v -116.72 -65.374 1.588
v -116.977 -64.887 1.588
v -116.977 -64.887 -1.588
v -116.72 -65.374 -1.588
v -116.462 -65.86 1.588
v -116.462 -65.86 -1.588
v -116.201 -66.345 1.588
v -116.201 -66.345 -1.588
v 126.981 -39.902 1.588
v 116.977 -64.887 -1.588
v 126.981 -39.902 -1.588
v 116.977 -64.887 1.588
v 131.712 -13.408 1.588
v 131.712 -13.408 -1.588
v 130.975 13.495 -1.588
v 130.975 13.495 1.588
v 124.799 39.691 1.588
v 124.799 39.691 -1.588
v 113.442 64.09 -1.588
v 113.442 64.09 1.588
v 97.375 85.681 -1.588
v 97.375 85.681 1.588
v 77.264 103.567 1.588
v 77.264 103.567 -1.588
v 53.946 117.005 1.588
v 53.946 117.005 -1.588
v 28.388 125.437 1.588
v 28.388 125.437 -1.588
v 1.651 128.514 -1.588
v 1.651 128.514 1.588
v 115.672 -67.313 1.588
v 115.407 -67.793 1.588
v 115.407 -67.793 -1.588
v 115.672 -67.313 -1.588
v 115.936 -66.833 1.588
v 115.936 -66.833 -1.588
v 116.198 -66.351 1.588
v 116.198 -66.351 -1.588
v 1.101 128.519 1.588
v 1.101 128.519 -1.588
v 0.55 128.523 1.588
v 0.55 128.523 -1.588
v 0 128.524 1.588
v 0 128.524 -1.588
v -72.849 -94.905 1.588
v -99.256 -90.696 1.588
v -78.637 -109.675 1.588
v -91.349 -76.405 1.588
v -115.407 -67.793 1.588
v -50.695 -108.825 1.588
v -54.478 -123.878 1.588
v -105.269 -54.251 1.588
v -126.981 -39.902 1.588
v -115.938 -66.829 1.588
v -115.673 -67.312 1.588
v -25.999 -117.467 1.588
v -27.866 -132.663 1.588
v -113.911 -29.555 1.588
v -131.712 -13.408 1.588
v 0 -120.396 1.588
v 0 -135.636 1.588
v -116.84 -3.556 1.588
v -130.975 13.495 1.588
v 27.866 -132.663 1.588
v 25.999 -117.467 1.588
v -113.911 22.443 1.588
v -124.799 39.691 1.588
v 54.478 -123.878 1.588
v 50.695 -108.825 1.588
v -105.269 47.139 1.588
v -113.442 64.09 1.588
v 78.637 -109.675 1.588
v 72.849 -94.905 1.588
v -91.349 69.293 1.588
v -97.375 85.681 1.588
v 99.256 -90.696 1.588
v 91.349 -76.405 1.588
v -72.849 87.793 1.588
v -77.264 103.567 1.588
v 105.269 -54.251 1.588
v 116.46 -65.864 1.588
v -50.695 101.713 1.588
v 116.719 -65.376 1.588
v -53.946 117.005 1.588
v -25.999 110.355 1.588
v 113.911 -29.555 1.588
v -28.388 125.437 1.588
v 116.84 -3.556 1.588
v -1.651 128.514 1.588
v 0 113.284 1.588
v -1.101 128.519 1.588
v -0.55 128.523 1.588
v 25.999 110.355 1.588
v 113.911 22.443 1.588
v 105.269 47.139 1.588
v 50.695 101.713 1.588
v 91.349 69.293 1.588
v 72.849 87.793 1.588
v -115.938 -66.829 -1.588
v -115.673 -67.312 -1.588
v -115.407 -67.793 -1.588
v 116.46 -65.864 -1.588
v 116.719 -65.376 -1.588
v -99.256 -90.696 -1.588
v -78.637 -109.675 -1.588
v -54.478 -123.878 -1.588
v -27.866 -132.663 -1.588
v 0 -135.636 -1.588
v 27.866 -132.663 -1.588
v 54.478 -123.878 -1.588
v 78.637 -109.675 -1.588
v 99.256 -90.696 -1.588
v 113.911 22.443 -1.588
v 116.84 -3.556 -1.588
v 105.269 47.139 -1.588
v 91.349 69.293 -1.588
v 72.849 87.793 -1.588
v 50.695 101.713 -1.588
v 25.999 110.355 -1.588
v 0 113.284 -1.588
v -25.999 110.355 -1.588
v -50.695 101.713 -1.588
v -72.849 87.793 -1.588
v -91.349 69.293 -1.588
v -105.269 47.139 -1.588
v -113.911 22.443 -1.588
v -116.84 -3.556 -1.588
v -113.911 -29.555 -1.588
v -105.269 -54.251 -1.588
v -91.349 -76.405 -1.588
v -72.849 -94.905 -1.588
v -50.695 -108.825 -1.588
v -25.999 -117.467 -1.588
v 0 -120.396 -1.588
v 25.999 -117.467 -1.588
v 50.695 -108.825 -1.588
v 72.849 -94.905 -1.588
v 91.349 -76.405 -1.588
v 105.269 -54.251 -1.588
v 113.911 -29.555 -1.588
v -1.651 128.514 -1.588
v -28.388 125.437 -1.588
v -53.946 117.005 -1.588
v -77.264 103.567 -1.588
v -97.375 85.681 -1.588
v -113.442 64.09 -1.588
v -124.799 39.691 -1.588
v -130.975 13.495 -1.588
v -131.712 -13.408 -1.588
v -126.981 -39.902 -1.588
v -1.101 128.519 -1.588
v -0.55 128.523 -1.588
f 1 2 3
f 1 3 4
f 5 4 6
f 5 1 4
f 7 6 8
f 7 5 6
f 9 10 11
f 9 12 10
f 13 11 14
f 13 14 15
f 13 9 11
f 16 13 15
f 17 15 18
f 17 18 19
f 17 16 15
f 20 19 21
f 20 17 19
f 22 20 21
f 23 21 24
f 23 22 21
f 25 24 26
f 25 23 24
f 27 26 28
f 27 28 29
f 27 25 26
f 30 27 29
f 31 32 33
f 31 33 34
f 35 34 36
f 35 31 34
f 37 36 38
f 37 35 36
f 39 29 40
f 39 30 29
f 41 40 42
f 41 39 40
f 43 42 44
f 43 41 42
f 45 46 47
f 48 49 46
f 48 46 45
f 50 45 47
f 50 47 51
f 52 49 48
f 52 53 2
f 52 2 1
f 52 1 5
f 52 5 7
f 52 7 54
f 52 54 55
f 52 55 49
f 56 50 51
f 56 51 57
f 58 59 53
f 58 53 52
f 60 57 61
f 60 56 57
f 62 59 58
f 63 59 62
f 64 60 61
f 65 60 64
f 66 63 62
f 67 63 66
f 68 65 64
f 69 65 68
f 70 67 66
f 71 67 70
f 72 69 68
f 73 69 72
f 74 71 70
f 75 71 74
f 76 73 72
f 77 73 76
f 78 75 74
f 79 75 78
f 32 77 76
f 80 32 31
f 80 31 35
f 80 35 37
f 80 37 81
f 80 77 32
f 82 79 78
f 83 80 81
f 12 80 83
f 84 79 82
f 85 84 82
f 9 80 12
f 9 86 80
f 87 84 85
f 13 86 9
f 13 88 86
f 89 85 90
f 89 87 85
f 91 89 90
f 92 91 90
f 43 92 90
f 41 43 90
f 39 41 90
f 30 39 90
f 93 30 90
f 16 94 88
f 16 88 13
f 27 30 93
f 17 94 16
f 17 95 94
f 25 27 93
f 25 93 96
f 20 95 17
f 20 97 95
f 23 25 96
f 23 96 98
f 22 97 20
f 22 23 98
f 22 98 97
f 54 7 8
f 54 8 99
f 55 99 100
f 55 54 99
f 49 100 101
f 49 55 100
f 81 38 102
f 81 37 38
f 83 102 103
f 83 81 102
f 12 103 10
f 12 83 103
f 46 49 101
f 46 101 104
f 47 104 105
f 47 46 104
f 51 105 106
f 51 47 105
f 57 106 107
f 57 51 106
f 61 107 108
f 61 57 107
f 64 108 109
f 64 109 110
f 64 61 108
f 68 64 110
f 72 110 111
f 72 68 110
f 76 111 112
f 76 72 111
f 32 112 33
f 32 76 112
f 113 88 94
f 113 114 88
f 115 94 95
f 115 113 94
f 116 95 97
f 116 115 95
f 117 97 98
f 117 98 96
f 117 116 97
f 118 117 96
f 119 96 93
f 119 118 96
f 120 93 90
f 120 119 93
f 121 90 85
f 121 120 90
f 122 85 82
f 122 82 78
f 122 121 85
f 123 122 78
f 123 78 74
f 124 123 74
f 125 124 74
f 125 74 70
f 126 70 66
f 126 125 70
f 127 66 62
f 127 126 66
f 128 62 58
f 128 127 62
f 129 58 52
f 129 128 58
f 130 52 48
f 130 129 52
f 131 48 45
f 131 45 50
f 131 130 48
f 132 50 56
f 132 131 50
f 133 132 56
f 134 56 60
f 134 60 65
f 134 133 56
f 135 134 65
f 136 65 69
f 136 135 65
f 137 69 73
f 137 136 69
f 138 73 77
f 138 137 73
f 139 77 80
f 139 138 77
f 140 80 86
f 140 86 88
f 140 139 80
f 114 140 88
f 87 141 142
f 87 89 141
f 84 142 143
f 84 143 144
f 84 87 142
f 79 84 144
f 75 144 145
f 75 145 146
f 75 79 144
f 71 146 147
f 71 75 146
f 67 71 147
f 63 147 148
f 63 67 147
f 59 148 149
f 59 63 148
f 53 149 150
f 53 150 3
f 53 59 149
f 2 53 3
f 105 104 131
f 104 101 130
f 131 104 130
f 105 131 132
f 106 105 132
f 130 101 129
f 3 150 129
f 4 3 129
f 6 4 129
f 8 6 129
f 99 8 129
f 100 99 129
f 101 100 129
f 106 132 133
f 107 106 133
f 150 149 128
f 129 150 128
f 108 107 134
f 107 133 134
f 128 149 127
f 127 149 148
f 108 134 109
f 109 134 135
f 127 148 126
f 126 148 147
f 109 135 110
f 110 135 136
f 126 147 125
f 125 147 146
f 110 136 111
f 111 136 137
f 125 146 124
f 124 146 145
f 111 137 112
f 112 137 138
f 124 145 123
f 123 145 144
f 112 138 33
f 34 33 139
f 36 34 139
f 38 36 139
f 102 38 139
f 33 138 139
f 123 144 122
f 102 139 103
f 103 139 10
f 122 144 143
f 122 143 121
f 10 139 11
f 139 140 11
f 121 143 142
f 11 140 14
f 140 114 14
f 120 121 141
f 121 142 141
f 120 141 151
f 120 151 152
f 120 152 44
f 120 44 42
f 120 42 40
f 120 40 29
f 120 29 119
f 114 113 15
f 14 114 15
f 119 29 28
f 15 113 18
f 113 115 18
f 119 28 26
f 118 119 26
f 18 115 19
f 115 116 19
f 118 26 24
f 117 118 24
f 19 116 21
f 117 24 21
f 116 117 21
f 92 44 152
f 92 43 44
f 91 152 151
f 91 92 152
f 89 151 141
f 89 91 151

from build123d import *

# Parameters (mm, degrees)
SKETCH2_R           = 116.84
BOSS_EXTRUDE1_DEPTH = 1.5875


with BuildPart() as part:
    # Sketch2 → Boss-Extrude1 (new, symmetric)
    with BuildSketch(Plane.XY):
        with BuildLine():
            ThreePointArc((-1.651, 128.513680847), (-113.44208216, 64.09028885), (-116.977106193, -64.886930424))
            ThreePointArc((-116.977106193, -64.886930424), (-116.59127356, -65.61727077), (-116.200881143, -66.345183954))
            ThreePointArc((-116.200881143, -66.345183954), (-115.806084025, -67.070386581), (-115.406761019, -67.793106963))
            ThreePointArc((-115.406761019, -67.793106963), (0, -135.636), (115.406761019, -67.793106963))
            ThreePointArc((115.406761019, -67.793106963), (115.804512811, -67.073251299), (116.197774523, -66.350932884))
            ThreePointArc((116.197774523, -66.350932884), (116.589738292, -65.620154913), (116.977106193, -64.886930424))
            ThreePointArc((116.977106193, -64.886930424), (113.44208216, 64.09028885), (1.651, 128.513680847))
            ThreePointArc((1.651, 128.513680847), (0.825516124, 128.521420187), (0, 128.524))
            ThreePointArc((0, 128.524), (-0.825516124, 128.521420187), (-1.651, 128.513680847))
        make_face()
        with Locations((0, -3.556)):
            Circle(SKETCH2_R, mode=Mode.SUBTRACT)
    extrude(amount=BOSS_EXTRUDE1_DEPTH, both=True)


solid = part.part
